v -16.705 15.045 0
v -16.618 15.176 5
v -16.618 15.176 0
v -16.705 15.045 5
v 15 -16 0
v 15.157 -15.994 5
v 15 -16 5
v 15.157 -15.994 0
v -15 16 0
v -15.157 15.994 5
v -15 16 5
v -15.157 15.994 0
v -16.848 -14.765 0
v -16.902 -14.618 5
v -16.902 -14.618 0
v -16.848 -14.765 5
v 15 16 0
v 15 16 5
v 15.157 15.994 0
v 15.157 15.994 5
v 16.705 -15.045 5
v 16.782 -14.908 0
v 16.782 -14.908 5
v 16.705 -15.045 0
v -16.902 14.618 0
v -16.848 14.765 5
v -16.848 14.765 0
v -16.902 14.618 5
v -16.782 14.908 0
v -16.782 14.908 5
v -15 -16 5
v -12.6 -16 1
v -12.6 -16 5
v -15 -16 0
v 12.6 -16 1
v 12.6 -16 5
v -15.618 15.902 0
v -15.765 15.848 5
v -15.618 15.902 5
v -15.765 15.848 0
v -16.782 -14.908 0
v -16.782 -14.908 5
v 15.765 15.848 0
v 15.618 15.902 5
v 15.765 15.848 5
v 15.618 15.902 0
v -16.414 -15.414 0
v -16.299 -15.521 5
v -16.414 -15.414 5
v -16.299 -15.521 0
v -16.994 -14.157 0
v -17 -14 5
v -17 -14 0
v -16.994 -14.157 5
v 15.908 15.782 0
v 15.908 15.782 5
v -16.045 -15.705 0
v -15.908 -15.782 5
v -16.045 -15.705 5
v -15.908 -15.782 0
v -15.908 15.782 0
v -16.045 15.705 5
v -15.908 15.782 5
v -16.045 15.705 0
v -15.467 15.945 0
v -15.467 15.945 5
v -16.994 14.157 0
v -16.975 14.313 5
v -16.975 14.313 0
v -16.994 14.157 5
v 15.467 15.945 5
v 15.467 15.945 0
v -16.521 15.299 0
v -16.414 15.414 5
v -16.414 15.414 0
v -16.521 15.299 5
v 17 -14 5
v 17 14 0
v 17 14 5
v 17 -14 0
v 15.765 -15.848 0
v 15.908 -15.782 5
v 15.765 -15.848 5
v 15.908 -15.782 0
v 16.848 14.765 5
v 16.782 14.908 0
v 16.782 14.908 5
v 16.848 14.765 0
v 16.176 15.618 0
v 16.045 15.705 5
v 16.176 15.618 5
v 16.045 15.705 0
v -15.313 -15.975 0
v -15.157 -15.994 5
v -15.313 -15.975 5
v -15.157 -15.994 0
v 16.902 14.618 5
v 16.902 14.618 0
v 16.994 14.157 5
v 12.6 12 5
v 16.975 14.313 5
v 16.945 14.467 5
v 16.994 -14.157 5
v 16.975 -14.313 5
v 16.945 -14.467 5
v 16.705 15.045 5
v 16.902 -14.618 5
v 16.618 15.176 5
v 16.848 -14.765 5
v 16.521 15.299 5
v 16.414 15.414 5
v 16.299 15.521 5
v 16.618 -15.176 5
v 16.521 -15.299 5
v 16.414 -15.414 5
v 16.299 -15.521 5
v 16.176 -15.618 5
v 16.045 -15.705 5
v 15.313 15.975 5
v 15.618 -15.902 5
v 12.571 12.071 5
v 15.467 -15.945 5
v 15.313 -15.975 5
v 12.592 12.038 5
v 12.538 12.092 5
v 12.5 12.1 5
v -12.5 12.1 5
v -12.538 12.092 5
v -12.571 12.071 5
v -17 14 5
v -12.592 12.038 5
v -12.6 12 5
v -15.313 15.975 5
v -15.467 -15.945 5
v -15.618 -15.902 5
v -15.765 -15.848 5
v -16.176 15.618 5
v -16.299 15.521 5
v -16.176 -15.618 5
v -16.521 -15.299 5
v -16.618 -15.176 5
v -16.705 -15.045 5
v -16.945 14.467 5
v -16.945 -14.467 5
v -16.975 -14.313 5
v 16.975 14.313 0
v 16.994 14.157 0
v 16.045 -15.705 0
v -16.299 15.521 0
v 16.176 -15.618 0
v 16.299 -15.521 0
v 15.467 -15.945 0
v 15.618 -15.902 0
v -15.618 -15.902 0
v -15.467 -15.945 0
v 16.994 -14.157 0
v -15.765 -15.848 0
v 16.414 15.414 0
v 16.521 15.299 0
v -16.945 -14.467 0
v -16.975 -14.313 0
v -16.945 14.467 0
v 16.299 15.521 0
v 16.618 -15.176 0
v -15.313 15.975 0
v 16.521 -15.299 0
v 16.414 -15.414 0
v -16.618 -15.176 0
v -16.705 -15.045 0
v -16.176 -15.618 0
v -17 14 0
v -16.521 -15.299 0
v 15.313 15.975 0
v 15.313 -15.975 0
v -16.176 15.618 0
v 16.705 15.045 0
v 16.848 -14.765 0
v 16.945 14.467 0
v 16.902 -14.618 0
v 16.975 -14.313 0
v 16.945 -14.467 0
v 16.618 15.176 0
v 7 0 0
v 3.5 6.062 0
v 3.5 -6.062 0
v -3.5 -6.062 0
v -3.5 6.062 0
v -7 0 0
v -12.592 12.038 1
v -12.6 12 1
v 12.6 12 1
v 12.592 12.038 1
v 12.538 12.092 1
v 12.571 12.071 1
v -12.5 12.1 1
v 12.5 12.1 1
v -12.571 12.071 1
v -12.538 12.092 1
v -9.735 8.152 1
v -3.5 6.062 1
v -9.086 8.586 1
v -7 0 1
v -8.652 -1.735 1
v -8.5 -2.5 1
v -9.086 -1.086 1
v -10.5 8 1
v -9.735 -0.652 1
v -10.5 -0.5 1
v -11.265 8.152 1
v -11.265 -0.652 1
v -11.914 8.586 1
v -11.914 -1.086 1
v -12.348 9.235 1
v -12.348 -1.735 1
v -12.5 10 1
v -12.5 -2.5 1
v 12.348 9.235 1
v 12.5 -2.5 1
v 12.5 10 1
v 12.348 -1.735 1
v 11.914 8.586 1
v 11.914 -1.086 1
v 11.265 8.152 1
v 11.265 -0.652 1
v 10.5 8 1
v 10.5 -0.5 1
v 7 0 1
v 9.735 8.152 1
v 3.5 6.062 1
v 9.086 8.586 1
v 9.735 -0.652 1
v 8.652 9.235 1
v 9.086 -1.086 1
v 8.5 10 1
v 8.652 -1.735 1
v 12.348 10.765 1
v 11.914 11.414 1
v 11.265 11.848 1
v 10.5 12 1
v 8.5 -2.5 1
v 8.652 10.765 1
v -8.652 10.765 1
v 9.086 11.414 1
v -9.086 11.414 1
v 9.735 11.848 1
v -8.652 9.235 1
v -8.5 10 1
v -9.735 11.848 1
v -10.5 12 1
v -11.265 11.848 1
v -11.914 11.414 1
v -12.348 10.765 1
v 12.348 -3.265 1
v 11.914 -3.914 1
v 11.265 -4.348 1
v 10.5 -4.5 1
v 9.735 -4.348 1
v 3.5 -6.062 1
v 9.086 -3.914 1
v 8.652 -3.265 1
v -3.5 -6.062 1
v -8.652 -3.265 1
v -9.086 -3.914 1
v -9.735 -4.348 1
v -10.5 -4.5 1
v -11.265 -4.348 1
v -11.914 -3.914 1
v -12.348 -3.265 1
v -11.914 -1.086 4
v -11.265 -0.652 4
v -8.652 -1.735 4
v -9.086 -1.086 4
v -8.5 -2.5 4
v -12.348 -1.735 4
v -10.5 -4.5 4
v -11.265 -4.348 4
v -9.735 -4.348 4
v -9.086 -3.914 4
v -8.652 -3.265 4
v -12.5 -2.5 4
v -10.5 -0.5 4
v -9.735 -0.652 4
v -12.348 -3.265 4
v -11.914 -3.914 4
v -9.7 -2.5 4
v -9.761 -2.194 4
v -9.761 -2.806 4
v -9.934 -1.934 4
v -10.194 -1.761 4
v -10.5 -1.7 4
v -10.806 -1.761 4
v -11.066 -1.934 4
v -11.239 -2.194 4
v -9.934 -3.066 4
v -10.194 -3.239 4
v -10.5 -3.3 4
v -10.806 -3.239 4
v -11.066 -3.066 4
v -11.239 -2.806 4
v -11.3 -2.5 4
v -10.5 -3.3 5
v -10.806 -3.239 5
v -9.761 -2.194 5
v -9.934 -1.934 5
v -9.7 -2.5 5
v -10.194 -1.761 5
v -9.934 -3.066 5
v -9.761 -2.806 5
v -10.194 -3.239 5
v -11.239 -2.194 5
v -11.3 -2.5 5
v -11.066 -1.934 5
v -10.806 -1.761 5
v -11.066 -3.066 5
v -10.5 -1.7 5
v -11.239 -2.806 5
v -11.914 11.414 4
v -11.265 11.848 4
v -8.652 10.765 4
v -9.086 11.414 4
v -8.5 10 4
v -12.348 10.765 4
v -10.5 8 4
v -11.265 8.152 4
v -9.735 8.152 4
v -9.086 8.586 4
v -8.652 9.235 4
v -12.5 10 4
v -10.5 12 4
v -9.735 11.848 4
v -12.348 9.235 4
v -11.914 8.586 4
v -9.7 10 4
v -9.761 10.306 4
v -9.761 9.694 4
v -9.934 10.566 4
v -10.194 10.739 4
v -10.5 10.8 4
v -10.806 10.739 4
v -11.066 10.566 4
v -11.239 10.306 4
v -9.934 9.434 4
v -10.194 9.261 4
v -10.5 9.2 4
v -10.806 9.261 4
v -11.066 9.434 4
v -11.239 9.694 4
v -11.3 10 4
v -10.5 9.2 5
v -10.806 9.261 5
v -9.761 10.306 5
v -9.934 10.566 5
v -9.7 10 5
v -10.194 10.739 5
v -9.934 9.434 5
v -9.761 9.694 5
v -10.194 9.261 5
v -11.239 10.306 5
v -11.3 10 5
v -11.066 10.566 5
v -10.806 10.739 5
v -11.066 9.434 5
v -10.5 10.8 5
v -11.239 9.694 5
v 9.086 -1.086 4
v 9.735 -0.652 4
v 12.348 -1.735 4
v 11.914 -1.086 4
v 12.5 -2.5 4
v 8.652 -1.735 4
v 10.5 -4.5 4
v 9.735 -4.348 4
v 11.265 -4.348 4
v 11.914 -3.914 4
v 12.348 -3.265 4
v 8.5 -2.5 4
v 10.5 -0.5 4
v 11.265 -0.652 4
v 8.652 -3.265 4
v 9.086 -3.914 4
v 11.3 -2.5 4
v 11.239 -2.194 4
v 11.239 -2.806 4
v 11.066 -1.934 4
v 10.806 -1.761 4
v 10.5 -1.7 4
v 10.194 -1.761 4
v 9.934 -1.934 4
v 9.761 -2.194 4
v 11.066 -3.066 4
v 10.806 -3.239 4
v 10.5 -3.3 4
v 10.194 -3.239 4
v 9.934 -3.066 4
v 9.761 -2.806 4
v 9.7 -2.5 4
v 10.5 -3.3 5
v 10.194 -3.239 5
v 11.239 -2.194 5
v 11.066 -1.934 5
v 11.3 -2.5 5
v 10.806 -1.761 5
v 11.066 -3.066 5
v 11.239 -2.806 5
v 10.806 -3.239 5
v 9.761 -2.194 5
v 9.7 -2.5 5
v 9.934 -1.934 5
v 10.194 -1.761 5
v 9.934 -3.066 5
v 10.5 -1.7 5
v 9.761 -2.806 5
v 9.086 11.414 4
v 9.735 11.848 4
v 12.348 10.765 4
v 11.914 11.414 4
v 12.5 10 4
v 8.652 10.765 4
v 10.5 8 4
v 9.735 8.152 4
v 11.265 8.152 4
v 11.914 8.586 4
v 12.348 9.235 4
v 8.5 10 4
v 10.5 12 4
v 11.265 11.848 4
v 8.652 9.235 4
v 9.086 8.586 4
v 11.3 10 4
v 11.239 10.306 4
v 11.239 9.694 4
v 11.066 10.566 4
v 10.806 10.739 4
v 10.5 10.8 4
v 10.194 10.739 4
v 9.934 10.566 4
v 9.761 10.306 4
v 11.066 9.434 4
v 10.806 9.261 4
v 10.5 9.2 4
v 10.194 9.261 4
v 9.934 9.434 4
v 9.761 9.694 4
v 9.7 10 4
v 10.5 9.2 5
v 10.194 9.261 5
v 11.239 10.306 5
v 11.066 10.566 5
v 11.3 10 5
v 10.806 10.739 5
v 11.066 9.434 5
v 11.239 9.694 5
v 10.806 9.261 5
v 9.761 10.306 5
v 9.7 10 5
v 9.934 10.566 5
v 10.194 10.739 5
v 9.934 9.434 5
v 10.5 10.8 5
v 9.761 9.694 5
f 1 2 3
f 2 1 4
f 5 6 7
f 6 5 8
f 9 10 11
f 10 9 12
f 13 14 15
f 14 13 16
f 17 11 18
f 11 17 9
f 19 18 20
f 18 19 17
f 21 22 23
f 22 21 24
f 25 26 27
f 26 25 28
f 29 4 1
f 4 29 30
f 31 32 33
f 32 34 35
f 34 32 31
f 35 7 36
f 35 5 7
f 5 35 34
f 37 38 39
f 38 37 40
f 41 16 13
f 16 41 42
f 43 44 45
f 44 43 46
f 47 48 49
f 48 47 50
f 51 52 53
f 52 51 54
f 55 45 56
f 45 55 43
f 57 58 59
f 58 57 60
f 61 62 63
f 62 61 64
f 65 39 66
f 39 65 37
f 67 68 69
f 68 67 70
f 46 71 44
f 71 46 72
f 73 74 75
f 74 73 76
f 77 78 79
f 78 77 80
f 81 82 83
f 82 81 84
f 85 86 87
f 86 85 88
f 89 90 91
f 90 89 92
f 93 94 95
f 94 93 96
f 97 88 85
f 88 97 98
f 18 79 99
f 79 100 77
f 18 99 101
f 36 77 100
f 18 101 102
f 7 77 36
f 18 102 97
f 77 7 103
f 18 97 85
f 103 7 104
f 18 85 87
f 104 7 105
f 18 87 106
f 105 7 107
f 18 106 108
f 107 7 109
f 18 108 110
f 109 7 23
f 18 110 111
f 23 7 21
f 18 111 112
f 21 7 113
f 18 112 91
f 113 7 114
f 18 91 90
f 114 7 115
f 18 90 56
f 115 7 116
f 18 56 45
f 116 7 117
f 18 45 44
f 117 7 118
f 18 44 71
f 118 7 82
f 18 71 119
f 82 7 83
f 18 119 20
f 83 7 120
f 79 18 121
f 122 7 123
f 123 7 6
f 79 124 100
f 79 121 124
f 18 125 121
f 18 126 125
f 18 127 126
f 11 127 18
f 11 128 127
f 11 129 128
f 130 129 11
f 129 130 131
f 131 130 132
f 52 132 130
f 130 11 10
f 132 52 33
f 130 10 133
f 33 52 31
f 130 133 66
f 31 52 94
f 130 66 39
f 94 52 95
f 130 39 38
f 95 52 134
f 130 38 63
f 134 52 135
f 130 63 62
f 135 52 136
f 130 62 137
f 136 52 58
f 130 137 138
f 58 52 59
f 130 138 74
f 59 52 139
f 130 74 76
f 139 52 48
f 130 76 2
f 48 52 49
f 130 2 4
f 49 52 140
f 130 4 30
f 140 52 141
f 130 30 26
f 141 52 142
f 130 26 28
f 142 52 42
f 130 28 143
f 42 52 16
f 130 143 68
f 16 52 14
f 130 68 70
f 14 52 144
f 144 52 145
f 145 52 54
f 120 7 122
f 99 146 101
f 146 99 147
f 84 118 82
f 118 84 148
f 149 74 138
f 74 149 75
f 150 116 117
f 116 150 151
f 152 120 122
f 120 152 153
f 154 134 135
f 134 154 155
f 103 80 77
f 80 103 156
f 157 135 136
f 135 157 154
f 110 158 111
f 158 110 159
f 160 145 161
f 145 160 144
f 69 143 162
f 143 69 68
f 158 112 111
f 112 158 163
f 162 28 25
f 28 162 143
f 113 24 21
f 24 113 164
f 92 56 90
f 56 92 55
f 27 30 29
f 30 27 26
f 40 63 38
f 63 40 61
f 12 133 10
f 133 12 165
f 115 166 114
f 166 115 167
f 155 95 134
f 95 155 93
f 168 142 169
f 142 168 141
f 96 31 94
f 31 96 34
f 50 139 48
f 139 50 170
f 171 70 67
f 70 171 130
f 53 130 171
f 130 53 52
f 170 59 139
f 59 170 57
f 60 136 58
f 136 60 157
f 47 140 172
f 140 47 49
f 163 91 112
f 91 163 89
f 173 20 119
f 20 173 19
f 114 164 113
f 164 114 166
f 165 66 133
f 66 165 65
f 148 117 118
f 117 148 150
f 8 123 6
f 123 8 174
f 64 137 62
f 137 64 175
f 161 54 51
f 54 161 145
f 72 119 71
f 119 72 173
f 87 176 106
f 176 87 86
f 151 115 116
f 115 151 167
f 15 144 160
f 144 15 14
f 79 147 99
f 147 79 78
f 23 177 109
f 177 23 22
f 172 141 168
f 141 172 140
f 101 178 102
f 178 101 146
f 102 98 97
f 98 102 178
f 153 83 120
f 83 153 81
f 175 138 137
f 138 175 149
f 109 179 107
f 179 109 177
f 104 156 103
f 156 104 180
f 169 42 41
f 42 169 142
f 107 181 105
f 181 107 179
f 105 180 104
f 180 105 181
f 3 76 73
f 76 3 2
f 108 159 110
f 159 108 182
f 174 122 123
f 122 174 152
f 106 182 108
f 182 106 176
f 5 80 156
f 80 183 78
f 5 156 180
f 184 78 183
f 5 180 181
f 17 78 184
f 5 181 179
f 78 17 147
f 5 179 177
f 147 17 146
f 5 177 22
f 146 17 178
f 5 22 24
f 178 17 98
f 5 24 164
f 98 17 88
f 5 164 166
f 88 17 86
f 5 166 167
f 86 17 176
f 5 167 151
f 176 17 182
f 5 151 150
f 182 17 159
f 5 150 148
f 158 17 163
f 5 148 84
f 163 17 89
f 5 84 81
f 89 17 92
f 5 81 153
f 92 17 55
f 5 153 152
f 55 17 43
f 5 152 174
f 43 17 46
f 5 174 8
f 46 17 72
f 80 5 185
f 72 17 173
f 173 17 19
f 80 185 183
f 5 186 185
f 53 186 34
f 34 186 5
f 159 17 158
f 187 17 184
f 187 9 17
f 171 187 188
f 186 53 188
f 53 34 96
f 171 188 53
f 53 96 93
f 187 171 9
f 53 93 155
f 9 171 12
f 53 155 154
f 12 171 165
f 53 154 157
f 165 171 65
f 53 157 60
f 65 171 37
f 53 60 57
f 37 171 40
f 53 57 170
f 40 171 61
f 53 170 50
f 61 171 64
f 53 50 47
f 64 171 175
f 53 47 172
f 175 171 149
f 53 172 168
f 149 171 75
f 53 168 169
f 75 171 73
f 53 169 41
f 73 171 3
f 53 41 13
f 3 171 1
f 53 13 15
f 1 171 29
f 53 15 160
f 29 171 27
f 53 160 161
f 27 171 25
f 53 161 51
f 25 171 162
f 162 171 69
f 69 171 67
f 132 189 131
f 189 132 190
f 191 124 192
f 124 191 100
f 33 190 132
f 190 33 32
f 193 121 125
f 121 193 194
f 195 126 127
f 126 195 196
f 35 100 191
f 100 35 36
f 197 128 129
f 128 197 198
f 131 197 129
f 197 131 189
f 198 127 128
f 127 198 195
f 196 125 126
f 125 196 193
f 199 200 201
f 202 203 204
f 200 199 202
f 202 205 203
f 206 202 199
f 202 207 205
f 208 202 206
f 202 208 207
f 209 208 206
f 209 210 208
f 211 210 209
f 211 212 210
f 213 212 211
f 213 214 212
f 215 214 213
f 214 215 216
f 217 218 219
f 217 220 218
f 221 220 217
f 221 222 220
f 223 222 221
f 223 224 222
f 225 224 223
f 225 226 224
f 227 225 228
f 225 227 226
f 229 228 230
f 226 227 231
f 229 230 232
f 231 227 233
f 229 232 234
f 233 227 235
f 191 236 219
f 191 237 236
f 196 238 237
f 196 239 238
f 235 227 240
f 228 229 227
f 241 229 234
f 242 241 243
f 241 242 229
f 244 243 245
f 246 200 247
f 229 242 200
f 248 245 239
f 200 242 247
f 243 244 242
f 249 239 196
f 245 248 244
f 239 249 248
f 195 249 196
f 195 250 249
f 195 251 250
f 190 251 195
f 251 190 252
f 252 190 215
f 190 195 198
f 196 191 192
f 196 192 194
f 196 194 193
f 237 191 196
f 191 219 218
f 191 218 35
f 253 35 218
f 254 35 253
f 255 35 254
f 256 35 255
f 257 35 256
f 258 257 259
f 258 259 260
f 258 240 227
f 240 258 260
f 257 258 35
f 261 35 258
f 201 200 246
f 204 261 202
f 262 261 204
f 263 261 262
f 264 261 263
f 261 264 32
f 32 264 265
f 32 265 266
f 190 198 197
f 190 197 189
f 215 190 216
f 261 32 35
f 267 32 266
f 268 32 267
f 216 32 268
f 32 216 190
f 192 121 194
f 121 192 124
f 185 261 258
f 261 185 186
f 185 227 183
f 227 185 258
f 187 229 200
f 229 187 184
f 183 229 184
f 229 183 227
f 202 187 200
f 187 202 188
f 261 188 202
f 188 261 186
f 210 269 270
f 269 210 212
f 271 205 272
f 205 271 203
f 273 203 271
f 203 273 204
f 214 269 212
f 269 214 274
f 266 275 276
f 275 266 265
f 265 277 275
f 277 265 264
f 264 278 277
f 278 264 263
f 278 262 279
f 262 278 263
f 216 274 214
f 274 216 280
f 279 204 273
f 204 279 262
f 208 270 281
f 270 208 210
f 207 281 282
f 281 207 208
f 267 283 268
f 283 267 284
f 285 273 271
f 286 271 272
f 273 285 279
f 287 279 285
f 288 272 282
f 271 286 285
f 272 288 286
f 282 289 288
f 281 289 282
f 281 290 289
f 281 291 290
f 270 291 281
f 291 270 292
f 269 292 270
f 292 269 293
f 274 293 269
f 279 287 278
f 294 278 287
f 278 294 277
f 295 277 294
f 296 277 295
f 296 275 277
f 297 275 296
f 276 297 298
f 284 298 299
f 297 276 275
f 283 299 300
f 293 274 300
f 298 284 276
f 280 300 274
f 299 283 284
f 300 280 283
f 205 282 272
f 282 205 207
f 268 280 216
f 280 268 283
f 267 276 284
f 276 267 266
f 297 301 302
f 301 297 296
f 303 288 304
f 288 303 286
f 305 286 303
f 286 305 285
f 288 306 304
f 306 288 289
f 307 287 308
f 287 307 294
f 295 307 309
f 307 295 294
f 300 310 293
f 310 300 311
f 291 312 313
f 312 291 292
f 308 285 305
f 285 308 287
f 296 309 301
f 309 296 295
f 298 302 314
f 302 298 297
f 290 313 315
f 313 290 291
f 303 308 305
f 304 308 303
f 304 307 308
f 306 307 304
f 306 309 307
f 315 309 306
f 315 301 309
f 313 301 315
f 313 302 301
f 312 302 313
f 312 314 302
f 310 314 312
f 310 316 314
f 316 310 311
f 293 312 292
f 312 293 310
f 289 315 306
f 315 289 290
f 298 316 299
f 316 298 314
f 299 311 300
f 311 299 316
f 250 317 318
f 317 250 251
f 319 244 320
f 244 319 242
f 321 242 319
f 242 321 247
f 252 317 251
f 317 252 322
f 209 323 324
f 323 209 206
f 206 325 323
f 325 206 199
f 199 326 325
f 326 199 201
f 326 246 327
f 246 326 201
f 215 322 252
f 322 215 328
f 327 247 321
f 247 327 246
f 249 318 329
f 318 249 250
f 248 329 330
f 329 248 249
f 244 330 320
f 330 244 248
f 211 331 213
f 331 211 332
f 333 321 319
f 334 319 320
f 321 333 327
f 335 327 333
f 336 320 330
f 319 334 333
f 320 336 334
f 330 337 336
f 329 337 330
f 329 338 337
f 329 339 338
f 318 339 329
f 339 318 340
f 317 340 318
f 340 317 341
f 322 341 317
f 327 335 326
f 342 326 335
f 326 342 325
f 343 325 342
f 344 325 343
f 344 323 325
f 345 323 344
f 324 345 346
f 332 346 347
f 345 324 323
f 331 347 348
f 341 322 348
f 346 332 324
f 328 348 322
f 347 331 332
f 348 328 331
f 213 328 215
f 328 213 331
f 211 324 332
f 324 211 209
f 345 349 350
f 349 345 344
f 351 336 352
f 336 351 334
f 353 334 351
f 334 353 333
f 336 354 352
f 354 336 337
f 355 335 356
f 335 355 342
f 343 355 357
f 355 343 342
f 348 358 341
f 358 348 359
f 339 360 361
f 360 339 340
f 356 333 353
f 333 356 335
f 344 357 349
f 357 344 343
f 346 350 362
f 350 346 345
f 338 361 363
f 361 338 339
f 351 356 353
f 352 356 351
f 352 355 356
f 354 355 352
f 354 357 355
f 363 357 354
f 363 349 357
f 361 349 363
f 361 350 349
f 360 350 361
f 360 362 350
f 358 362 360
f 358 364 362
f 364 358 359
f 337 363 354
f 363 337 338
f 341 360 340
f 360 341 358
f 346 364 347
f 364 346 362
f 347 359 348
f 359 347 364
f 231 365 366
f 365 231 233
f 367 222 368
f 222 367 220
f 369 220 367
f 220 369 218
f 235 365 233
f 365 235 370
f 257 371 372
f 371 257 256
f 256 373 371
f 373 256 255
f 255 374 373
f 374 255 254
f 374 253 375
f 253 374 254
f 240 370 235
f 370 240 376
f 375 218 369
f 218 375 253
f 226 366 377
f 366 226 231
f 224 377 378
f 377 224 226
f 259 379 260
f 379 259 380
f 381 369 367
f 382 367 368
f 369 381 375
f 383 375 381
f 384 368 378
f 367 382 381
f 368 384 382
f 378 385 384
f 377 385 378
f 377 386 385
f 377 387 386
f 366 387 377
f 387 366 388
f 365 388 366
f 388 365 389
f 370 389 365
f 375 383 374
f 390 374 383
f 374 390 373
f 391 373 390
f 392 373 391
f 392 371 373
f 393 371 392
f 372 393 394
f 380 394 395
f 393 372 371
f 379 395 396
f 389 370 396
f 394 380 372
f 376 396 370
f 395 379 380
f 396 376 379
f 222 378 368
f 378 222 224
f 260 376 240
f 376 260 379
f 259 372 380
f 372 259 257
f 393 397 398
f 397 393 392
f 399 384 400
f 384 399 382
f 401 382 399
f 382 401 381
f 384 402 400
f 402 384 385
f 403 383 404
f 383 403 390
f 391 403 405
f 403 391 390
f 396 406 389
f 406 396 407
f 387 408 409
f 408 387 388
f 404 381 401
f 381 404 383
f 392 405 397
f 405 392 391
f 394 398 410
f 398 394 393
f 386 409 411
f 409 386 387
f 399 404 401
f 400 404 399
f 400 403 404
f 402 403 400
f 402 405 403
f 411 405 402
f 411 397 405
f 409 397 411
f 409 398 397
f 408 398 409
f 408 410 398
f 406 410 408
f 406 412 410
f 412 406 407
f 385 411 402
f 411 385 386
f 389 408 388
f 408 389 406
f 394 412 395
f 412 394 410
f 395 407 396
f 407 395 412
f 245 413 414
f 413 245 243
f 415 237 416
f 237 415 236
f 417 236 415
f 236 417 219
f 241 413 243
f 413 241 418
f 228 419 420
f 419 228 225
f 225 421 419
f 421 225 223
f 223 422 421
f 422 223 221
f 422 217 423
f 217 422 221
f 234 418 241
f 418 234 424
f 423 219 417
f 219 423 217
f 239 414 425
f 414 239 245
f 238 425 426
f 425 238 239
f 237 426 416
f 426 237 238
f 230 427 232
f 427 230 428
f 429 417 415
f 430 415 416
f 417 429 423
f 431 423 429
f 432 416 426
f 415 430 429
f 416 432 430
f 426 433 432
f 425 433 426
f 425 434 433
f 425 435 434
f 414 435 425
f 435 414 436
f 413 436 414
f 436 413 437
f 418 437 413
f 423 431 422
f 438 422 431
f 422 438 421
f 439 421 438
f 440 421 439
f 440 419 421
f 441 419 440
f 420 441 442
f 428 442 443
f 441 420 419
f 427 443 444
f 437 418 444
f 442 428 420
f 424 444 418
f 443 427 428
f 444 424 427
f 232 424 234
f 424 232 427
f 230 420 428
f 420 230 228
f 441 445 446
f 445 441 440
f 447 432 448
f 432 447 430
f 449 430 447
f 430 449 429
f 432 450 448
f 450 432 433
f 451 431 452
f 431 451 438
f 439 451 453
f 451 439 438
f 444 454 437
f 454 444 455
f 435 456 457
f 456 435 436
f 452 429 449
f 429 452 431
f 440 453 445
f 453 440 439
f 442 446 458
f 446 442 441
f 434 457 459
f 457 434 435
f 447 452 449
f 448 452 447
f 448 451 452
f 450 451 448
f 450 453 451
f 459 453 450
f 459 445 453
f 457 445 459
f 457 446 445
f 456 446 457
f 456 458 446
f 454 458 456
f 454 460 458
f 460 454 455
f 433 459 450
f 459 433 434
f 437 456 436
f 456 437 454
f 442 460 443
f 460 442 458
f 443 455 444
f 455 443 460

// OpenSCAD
// cambase.scad
// This is the back for the camera



module cambase(){
   
// base borrowed from pieye
difference(){
    color("yellow")
    linear_extrude(height=5)
    offset(r=2,$fn=80)    
    square(size=[30,28],center=true);

    translate([0,-2,1])
    color("orange")
    linear_extrude(height=5)
    offset(r=0.1,$fn=16)    
    square(size=[25,24+4],center=true);

    translate([-8.5,-15,2])
    color("green")
    cube([17,5,5]);
    
    translate([0,0,-1])
    cylinder(r=7,h=5,$fn=6);

}

// posts to support PCB
translate([-10.5,9.5-12,1]){
    cylinder(r=2,h=3,$fn=16);
    cylinder(r=0.8,h=4,$fn=16);
}
translate([-10.5,22-12,1]){
    cylinder(r=2,h=3,$fn=16);
    cylinder(r=0.8,h=4,$fn=16);
}
translate([23.0-12.5,9.5-12,1]){
    cylinder(r=2,h=3,$fn=16);
    cylinder(r=0.8,h=4,$fn=16);
}
translate([23.0-12.5,22-12,1]){
    cylinder(r=2,h=3,$fn=16);
    cylinder(r=0.8,h=4,$fn=16);
}

} // --------- end module cambase ------------

cambase();
